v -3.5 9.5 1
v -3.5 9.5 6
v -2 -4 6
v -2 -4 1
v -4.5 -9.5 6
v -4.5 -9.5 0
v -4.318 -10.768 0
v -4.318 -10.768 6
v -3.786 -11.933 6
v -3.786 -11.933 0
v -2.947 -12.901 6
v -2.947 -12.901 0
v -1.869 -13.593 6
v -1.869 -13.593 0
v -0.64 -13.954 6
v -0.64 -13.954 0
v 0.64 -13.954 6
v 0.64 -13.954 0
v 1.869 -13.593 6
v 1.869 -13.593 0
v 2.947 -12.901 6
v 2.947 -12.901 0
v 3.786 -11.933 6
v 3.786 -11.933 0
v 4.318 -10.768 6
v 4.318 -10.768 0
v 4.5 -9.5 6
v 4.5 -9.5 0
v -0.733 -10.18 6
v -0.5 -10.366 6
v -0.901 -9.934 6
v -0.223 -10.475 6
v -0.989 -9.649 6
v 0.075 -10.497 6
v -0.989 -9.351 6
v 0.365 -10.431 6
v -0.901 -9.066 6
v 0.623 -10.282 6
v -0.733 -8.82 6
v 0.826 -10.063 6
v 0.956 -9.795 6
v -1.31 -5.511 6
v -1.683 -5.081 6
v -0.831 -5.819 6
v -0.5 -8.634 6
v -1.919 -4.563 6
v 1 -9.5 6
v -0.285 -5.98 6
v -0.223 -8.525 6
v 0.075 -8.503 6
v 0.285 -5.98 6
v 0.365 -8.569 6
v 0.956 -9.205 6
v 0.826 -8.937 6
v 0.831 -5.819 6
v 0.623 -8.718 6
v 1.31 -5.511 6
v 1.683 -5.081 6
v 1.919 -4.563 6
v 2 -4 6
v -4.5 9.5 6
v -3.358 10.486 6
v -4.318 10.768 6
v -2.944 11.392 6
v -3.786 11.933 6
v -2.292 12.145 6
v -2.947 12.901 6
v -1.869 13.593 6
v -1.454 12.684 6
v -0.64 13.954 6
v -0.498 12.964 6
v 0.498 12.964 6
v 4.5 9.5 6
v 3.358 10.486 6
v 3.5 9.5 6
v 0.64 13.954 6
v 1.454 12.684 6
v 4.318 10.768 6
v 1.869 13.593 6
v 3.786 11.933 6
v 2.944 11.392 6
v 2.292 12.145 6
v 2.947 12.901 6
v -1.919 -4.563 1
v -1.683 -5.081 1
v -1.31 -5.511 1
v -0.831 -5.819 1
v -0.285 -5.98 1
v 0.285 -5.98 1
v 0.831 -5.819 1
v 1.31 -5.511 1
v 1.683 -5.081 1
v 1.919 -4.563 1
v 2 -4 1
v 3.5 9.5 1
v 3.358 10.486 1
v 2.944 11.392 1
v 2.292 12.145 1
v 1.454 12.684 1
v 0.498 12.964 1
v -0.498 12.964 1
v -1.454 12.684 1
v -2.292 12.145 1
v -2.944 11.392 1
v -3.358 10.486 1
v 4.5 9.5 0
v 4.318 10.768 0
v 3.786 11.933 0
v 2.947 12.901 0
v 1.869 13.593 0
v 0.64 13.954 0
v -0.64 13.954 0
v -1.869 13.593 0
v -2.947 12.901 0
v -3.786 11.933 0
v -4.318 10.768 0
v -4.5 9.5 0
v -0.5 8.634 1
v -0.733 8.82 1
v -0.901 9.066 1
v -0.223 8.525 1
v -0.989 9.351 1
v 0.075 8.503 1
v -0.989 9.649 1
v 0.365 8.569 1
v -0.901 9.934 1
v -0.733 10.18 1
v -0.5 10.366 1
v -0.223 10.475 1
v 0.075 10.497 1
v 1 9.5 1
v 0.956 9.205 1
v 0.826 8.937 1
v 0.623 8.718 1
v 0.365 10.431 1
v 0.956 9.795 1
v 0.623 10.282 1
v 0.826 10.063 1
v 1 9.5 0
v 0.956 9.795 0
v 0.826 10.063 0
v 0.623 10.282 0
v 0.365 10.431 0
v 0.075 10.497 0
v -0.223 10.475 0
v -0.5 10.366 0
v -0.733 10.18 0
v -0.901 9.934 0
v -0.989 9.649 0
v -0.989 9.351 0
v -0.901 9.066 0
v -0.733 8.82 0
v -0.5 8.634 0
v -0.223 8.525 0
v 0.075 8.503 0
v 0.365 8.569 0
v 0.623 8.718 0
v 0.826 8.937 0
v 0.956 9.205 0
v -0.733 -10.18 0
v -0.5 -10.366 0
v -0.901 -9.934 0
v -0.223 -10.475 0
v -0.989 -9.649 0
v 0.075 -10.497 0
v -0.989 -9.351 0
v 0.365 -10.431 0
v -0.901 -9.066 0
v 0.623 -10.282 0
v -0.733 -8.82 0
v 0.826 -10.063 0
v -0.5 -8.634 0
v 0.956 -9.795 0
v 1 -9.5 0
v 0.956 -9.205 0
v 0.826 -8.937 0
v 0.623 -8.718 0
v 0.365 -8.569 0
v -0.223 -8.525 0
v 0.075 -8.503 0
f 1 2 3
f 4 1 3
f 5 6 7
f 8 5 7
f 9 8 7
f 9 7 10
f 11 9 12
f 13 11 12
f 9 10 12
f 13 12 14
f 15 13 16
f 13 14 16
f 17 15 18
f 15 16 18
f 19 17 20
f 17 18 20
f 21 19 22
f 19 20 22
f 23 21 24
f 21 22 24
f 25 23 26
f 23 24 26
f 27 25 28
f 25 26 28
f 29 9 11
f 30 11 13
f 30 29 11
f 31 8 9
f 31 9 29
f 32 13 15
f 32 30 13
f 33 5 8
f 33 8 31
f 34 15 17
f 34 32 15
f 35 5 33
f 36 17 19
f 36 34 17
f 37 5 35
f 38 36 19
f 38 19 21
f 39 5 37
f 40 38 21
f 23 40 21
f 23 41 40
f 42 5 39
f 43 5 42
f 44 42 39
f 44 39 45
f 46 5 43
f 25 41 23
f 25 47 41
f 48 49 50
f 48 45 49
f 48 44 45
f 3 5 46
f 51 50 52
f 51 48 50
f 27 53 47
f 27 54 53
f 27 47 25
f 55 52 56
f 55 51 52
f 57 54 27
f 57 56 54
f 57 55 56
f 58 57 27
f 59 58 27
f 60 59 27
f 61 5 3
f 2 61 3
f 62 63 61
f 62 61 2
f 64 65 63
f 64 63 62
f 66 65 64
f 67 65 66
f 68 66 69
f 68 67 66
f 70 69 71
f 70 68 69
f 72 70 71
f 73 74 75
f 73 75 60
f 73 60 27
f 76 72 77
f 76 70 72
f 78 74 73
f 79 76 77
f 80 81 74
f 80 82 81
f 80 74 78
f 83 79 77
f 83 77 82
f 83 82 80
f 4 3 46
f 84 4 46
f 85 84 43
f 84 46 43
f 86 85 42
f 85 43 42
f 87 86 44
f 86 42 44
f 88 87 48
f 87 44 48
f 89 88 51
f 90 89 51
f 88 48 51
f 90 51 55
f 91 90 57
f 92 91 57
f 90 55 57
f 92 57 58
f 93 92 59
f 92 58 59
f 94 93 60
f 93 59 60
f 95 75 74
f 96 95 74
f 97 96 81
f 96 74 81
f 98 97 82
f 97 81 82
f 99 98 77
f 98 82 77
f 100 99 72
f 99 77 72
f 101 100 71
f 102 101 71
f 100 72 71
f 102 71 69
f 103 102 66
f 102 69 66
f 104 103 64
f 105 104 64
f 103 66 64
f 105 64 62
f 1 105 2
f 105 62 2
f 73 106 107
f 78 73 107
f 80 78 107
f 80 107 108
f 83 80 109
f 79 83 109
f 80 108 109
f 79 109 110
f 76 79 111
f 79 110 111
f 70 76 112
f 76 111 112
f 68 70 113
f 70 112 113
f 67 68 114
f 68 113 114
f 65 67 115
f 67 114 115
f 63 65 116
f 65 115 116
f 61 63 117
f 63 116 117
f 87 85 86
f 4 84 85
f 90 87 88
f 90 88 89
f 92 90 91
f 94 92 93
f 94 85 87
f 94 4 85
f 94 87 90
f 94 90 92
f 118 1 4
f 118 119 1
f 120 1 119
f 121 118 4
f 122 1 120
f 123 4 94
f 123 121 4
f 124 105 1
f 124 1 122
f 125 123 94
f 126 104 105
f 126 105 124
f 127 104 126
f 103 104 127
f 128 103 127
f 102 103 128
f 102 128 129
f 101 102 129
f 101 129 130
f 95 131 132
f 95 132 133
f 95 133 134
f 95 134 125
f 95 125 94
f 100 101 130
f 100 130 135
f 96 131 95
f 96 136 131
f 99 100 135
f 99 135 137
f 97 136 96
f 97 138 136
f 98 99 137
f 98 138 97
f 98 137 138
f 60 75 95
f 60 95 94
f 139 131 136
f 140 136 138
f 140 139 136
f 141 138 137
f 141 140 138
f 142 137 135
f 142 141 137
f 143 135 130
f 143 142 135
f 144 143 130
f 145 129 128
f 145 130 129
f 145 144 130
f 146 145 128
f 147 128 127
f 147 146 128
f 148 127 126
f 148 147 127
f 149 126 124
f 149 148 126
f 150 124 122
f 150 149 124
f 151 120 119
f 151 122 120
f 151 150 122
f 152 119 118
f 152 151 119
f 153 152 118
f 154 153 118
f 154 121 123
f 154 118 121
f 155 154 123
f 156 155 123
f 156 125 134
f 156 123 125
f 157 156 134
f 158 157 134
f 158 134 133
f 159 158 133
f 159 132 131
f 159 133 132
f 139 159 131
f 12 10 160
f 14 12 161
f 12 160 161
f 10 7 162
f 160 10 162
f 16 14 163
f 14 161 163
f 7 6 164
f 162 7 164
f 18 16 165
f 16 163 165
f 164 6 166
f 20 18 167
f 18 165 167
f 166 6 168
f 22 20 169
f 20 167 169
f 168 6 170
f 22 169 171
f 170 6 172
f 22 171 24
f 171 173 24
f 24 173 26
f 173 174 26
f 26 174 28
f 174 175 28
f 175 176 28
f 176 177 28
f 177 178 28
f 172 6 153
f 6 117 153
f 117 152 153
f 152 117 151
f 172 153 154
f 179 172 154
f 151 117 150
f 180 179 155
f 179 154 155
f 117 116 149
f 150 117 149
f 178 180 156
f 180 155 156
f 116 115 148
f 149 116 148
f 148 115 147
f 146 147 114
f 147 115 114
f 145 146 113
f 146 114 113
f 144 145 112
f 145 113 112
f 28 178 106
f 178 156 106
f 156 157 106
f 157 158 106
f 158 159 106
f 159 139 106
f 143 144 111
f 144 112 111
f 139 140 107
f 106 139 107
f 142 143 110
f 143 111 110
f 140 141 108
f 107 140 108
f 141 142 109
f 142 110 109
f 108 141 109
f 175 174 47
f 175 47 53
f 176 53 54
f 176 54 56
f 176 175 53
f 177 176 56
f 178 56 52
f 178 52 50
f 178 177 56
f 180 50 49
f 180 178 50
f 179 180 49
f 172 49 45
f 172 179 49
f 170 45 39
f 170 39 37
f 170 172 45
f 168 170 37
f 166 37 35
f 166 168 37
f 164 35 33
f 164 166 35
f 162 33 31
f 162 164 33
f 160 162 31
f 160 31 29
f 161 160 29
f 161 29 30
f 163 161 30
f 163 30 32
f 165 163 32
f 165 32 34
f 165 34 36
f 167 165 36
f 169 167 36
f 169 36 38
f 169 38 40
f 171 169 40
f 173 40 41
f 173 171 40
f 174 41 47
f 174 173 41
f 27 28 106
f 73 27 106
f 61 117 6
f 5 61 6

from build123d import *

# Parameters (mm, degrees)
SKETCH_R     = 1
PAD_DEPTH    = 6
POCKET_DEPTH = 5


with BuildPart() as part:
    # Sketch → Pad (new body)
    with BuildSketch(Plane.XY):
        with BuildLine():
            ThreePointArc((4.5, 9.5), (0, 14), (-4.5, 9.5))
            Line((-4.5, 9.5), (-4.5, -9.5))
            ThreePointArc((-4.5, -9.5), (0, -14), (4.5, -9.5))
            Line((4.5, -9.5), (4.5, 9.5))
        make_face()
        with Locations((0, 9.5)):
            Circle(SKETCH_R, mode=Mode.SUBTRACT)
        with Locations((0, -9.5)):
            Circle(SKETCH_R, mode=Mode.SUBTRACT)
    extrude(amount=PAD_DEPTH)

    # Sketch001 (on Face8 of Pad) → Pocket (cut)
    with BuildSketch(Plane.XY.offset(6)):
        with BuildLine():
            ThreePointArc((3.5, 9.5), (0, 13), (-3.5, 9.5))
            Line((-3.5, 9.5), (-2, -4))
            ThreePointArc((-2, -4), (0, -6), (2, -4))
            Line((3.5, 9.5), (2, -4))
        make_face()
    extrude(amount=-POCKET_DEPTH, mode=Mode.SUBTRACT)


solid = part.part
